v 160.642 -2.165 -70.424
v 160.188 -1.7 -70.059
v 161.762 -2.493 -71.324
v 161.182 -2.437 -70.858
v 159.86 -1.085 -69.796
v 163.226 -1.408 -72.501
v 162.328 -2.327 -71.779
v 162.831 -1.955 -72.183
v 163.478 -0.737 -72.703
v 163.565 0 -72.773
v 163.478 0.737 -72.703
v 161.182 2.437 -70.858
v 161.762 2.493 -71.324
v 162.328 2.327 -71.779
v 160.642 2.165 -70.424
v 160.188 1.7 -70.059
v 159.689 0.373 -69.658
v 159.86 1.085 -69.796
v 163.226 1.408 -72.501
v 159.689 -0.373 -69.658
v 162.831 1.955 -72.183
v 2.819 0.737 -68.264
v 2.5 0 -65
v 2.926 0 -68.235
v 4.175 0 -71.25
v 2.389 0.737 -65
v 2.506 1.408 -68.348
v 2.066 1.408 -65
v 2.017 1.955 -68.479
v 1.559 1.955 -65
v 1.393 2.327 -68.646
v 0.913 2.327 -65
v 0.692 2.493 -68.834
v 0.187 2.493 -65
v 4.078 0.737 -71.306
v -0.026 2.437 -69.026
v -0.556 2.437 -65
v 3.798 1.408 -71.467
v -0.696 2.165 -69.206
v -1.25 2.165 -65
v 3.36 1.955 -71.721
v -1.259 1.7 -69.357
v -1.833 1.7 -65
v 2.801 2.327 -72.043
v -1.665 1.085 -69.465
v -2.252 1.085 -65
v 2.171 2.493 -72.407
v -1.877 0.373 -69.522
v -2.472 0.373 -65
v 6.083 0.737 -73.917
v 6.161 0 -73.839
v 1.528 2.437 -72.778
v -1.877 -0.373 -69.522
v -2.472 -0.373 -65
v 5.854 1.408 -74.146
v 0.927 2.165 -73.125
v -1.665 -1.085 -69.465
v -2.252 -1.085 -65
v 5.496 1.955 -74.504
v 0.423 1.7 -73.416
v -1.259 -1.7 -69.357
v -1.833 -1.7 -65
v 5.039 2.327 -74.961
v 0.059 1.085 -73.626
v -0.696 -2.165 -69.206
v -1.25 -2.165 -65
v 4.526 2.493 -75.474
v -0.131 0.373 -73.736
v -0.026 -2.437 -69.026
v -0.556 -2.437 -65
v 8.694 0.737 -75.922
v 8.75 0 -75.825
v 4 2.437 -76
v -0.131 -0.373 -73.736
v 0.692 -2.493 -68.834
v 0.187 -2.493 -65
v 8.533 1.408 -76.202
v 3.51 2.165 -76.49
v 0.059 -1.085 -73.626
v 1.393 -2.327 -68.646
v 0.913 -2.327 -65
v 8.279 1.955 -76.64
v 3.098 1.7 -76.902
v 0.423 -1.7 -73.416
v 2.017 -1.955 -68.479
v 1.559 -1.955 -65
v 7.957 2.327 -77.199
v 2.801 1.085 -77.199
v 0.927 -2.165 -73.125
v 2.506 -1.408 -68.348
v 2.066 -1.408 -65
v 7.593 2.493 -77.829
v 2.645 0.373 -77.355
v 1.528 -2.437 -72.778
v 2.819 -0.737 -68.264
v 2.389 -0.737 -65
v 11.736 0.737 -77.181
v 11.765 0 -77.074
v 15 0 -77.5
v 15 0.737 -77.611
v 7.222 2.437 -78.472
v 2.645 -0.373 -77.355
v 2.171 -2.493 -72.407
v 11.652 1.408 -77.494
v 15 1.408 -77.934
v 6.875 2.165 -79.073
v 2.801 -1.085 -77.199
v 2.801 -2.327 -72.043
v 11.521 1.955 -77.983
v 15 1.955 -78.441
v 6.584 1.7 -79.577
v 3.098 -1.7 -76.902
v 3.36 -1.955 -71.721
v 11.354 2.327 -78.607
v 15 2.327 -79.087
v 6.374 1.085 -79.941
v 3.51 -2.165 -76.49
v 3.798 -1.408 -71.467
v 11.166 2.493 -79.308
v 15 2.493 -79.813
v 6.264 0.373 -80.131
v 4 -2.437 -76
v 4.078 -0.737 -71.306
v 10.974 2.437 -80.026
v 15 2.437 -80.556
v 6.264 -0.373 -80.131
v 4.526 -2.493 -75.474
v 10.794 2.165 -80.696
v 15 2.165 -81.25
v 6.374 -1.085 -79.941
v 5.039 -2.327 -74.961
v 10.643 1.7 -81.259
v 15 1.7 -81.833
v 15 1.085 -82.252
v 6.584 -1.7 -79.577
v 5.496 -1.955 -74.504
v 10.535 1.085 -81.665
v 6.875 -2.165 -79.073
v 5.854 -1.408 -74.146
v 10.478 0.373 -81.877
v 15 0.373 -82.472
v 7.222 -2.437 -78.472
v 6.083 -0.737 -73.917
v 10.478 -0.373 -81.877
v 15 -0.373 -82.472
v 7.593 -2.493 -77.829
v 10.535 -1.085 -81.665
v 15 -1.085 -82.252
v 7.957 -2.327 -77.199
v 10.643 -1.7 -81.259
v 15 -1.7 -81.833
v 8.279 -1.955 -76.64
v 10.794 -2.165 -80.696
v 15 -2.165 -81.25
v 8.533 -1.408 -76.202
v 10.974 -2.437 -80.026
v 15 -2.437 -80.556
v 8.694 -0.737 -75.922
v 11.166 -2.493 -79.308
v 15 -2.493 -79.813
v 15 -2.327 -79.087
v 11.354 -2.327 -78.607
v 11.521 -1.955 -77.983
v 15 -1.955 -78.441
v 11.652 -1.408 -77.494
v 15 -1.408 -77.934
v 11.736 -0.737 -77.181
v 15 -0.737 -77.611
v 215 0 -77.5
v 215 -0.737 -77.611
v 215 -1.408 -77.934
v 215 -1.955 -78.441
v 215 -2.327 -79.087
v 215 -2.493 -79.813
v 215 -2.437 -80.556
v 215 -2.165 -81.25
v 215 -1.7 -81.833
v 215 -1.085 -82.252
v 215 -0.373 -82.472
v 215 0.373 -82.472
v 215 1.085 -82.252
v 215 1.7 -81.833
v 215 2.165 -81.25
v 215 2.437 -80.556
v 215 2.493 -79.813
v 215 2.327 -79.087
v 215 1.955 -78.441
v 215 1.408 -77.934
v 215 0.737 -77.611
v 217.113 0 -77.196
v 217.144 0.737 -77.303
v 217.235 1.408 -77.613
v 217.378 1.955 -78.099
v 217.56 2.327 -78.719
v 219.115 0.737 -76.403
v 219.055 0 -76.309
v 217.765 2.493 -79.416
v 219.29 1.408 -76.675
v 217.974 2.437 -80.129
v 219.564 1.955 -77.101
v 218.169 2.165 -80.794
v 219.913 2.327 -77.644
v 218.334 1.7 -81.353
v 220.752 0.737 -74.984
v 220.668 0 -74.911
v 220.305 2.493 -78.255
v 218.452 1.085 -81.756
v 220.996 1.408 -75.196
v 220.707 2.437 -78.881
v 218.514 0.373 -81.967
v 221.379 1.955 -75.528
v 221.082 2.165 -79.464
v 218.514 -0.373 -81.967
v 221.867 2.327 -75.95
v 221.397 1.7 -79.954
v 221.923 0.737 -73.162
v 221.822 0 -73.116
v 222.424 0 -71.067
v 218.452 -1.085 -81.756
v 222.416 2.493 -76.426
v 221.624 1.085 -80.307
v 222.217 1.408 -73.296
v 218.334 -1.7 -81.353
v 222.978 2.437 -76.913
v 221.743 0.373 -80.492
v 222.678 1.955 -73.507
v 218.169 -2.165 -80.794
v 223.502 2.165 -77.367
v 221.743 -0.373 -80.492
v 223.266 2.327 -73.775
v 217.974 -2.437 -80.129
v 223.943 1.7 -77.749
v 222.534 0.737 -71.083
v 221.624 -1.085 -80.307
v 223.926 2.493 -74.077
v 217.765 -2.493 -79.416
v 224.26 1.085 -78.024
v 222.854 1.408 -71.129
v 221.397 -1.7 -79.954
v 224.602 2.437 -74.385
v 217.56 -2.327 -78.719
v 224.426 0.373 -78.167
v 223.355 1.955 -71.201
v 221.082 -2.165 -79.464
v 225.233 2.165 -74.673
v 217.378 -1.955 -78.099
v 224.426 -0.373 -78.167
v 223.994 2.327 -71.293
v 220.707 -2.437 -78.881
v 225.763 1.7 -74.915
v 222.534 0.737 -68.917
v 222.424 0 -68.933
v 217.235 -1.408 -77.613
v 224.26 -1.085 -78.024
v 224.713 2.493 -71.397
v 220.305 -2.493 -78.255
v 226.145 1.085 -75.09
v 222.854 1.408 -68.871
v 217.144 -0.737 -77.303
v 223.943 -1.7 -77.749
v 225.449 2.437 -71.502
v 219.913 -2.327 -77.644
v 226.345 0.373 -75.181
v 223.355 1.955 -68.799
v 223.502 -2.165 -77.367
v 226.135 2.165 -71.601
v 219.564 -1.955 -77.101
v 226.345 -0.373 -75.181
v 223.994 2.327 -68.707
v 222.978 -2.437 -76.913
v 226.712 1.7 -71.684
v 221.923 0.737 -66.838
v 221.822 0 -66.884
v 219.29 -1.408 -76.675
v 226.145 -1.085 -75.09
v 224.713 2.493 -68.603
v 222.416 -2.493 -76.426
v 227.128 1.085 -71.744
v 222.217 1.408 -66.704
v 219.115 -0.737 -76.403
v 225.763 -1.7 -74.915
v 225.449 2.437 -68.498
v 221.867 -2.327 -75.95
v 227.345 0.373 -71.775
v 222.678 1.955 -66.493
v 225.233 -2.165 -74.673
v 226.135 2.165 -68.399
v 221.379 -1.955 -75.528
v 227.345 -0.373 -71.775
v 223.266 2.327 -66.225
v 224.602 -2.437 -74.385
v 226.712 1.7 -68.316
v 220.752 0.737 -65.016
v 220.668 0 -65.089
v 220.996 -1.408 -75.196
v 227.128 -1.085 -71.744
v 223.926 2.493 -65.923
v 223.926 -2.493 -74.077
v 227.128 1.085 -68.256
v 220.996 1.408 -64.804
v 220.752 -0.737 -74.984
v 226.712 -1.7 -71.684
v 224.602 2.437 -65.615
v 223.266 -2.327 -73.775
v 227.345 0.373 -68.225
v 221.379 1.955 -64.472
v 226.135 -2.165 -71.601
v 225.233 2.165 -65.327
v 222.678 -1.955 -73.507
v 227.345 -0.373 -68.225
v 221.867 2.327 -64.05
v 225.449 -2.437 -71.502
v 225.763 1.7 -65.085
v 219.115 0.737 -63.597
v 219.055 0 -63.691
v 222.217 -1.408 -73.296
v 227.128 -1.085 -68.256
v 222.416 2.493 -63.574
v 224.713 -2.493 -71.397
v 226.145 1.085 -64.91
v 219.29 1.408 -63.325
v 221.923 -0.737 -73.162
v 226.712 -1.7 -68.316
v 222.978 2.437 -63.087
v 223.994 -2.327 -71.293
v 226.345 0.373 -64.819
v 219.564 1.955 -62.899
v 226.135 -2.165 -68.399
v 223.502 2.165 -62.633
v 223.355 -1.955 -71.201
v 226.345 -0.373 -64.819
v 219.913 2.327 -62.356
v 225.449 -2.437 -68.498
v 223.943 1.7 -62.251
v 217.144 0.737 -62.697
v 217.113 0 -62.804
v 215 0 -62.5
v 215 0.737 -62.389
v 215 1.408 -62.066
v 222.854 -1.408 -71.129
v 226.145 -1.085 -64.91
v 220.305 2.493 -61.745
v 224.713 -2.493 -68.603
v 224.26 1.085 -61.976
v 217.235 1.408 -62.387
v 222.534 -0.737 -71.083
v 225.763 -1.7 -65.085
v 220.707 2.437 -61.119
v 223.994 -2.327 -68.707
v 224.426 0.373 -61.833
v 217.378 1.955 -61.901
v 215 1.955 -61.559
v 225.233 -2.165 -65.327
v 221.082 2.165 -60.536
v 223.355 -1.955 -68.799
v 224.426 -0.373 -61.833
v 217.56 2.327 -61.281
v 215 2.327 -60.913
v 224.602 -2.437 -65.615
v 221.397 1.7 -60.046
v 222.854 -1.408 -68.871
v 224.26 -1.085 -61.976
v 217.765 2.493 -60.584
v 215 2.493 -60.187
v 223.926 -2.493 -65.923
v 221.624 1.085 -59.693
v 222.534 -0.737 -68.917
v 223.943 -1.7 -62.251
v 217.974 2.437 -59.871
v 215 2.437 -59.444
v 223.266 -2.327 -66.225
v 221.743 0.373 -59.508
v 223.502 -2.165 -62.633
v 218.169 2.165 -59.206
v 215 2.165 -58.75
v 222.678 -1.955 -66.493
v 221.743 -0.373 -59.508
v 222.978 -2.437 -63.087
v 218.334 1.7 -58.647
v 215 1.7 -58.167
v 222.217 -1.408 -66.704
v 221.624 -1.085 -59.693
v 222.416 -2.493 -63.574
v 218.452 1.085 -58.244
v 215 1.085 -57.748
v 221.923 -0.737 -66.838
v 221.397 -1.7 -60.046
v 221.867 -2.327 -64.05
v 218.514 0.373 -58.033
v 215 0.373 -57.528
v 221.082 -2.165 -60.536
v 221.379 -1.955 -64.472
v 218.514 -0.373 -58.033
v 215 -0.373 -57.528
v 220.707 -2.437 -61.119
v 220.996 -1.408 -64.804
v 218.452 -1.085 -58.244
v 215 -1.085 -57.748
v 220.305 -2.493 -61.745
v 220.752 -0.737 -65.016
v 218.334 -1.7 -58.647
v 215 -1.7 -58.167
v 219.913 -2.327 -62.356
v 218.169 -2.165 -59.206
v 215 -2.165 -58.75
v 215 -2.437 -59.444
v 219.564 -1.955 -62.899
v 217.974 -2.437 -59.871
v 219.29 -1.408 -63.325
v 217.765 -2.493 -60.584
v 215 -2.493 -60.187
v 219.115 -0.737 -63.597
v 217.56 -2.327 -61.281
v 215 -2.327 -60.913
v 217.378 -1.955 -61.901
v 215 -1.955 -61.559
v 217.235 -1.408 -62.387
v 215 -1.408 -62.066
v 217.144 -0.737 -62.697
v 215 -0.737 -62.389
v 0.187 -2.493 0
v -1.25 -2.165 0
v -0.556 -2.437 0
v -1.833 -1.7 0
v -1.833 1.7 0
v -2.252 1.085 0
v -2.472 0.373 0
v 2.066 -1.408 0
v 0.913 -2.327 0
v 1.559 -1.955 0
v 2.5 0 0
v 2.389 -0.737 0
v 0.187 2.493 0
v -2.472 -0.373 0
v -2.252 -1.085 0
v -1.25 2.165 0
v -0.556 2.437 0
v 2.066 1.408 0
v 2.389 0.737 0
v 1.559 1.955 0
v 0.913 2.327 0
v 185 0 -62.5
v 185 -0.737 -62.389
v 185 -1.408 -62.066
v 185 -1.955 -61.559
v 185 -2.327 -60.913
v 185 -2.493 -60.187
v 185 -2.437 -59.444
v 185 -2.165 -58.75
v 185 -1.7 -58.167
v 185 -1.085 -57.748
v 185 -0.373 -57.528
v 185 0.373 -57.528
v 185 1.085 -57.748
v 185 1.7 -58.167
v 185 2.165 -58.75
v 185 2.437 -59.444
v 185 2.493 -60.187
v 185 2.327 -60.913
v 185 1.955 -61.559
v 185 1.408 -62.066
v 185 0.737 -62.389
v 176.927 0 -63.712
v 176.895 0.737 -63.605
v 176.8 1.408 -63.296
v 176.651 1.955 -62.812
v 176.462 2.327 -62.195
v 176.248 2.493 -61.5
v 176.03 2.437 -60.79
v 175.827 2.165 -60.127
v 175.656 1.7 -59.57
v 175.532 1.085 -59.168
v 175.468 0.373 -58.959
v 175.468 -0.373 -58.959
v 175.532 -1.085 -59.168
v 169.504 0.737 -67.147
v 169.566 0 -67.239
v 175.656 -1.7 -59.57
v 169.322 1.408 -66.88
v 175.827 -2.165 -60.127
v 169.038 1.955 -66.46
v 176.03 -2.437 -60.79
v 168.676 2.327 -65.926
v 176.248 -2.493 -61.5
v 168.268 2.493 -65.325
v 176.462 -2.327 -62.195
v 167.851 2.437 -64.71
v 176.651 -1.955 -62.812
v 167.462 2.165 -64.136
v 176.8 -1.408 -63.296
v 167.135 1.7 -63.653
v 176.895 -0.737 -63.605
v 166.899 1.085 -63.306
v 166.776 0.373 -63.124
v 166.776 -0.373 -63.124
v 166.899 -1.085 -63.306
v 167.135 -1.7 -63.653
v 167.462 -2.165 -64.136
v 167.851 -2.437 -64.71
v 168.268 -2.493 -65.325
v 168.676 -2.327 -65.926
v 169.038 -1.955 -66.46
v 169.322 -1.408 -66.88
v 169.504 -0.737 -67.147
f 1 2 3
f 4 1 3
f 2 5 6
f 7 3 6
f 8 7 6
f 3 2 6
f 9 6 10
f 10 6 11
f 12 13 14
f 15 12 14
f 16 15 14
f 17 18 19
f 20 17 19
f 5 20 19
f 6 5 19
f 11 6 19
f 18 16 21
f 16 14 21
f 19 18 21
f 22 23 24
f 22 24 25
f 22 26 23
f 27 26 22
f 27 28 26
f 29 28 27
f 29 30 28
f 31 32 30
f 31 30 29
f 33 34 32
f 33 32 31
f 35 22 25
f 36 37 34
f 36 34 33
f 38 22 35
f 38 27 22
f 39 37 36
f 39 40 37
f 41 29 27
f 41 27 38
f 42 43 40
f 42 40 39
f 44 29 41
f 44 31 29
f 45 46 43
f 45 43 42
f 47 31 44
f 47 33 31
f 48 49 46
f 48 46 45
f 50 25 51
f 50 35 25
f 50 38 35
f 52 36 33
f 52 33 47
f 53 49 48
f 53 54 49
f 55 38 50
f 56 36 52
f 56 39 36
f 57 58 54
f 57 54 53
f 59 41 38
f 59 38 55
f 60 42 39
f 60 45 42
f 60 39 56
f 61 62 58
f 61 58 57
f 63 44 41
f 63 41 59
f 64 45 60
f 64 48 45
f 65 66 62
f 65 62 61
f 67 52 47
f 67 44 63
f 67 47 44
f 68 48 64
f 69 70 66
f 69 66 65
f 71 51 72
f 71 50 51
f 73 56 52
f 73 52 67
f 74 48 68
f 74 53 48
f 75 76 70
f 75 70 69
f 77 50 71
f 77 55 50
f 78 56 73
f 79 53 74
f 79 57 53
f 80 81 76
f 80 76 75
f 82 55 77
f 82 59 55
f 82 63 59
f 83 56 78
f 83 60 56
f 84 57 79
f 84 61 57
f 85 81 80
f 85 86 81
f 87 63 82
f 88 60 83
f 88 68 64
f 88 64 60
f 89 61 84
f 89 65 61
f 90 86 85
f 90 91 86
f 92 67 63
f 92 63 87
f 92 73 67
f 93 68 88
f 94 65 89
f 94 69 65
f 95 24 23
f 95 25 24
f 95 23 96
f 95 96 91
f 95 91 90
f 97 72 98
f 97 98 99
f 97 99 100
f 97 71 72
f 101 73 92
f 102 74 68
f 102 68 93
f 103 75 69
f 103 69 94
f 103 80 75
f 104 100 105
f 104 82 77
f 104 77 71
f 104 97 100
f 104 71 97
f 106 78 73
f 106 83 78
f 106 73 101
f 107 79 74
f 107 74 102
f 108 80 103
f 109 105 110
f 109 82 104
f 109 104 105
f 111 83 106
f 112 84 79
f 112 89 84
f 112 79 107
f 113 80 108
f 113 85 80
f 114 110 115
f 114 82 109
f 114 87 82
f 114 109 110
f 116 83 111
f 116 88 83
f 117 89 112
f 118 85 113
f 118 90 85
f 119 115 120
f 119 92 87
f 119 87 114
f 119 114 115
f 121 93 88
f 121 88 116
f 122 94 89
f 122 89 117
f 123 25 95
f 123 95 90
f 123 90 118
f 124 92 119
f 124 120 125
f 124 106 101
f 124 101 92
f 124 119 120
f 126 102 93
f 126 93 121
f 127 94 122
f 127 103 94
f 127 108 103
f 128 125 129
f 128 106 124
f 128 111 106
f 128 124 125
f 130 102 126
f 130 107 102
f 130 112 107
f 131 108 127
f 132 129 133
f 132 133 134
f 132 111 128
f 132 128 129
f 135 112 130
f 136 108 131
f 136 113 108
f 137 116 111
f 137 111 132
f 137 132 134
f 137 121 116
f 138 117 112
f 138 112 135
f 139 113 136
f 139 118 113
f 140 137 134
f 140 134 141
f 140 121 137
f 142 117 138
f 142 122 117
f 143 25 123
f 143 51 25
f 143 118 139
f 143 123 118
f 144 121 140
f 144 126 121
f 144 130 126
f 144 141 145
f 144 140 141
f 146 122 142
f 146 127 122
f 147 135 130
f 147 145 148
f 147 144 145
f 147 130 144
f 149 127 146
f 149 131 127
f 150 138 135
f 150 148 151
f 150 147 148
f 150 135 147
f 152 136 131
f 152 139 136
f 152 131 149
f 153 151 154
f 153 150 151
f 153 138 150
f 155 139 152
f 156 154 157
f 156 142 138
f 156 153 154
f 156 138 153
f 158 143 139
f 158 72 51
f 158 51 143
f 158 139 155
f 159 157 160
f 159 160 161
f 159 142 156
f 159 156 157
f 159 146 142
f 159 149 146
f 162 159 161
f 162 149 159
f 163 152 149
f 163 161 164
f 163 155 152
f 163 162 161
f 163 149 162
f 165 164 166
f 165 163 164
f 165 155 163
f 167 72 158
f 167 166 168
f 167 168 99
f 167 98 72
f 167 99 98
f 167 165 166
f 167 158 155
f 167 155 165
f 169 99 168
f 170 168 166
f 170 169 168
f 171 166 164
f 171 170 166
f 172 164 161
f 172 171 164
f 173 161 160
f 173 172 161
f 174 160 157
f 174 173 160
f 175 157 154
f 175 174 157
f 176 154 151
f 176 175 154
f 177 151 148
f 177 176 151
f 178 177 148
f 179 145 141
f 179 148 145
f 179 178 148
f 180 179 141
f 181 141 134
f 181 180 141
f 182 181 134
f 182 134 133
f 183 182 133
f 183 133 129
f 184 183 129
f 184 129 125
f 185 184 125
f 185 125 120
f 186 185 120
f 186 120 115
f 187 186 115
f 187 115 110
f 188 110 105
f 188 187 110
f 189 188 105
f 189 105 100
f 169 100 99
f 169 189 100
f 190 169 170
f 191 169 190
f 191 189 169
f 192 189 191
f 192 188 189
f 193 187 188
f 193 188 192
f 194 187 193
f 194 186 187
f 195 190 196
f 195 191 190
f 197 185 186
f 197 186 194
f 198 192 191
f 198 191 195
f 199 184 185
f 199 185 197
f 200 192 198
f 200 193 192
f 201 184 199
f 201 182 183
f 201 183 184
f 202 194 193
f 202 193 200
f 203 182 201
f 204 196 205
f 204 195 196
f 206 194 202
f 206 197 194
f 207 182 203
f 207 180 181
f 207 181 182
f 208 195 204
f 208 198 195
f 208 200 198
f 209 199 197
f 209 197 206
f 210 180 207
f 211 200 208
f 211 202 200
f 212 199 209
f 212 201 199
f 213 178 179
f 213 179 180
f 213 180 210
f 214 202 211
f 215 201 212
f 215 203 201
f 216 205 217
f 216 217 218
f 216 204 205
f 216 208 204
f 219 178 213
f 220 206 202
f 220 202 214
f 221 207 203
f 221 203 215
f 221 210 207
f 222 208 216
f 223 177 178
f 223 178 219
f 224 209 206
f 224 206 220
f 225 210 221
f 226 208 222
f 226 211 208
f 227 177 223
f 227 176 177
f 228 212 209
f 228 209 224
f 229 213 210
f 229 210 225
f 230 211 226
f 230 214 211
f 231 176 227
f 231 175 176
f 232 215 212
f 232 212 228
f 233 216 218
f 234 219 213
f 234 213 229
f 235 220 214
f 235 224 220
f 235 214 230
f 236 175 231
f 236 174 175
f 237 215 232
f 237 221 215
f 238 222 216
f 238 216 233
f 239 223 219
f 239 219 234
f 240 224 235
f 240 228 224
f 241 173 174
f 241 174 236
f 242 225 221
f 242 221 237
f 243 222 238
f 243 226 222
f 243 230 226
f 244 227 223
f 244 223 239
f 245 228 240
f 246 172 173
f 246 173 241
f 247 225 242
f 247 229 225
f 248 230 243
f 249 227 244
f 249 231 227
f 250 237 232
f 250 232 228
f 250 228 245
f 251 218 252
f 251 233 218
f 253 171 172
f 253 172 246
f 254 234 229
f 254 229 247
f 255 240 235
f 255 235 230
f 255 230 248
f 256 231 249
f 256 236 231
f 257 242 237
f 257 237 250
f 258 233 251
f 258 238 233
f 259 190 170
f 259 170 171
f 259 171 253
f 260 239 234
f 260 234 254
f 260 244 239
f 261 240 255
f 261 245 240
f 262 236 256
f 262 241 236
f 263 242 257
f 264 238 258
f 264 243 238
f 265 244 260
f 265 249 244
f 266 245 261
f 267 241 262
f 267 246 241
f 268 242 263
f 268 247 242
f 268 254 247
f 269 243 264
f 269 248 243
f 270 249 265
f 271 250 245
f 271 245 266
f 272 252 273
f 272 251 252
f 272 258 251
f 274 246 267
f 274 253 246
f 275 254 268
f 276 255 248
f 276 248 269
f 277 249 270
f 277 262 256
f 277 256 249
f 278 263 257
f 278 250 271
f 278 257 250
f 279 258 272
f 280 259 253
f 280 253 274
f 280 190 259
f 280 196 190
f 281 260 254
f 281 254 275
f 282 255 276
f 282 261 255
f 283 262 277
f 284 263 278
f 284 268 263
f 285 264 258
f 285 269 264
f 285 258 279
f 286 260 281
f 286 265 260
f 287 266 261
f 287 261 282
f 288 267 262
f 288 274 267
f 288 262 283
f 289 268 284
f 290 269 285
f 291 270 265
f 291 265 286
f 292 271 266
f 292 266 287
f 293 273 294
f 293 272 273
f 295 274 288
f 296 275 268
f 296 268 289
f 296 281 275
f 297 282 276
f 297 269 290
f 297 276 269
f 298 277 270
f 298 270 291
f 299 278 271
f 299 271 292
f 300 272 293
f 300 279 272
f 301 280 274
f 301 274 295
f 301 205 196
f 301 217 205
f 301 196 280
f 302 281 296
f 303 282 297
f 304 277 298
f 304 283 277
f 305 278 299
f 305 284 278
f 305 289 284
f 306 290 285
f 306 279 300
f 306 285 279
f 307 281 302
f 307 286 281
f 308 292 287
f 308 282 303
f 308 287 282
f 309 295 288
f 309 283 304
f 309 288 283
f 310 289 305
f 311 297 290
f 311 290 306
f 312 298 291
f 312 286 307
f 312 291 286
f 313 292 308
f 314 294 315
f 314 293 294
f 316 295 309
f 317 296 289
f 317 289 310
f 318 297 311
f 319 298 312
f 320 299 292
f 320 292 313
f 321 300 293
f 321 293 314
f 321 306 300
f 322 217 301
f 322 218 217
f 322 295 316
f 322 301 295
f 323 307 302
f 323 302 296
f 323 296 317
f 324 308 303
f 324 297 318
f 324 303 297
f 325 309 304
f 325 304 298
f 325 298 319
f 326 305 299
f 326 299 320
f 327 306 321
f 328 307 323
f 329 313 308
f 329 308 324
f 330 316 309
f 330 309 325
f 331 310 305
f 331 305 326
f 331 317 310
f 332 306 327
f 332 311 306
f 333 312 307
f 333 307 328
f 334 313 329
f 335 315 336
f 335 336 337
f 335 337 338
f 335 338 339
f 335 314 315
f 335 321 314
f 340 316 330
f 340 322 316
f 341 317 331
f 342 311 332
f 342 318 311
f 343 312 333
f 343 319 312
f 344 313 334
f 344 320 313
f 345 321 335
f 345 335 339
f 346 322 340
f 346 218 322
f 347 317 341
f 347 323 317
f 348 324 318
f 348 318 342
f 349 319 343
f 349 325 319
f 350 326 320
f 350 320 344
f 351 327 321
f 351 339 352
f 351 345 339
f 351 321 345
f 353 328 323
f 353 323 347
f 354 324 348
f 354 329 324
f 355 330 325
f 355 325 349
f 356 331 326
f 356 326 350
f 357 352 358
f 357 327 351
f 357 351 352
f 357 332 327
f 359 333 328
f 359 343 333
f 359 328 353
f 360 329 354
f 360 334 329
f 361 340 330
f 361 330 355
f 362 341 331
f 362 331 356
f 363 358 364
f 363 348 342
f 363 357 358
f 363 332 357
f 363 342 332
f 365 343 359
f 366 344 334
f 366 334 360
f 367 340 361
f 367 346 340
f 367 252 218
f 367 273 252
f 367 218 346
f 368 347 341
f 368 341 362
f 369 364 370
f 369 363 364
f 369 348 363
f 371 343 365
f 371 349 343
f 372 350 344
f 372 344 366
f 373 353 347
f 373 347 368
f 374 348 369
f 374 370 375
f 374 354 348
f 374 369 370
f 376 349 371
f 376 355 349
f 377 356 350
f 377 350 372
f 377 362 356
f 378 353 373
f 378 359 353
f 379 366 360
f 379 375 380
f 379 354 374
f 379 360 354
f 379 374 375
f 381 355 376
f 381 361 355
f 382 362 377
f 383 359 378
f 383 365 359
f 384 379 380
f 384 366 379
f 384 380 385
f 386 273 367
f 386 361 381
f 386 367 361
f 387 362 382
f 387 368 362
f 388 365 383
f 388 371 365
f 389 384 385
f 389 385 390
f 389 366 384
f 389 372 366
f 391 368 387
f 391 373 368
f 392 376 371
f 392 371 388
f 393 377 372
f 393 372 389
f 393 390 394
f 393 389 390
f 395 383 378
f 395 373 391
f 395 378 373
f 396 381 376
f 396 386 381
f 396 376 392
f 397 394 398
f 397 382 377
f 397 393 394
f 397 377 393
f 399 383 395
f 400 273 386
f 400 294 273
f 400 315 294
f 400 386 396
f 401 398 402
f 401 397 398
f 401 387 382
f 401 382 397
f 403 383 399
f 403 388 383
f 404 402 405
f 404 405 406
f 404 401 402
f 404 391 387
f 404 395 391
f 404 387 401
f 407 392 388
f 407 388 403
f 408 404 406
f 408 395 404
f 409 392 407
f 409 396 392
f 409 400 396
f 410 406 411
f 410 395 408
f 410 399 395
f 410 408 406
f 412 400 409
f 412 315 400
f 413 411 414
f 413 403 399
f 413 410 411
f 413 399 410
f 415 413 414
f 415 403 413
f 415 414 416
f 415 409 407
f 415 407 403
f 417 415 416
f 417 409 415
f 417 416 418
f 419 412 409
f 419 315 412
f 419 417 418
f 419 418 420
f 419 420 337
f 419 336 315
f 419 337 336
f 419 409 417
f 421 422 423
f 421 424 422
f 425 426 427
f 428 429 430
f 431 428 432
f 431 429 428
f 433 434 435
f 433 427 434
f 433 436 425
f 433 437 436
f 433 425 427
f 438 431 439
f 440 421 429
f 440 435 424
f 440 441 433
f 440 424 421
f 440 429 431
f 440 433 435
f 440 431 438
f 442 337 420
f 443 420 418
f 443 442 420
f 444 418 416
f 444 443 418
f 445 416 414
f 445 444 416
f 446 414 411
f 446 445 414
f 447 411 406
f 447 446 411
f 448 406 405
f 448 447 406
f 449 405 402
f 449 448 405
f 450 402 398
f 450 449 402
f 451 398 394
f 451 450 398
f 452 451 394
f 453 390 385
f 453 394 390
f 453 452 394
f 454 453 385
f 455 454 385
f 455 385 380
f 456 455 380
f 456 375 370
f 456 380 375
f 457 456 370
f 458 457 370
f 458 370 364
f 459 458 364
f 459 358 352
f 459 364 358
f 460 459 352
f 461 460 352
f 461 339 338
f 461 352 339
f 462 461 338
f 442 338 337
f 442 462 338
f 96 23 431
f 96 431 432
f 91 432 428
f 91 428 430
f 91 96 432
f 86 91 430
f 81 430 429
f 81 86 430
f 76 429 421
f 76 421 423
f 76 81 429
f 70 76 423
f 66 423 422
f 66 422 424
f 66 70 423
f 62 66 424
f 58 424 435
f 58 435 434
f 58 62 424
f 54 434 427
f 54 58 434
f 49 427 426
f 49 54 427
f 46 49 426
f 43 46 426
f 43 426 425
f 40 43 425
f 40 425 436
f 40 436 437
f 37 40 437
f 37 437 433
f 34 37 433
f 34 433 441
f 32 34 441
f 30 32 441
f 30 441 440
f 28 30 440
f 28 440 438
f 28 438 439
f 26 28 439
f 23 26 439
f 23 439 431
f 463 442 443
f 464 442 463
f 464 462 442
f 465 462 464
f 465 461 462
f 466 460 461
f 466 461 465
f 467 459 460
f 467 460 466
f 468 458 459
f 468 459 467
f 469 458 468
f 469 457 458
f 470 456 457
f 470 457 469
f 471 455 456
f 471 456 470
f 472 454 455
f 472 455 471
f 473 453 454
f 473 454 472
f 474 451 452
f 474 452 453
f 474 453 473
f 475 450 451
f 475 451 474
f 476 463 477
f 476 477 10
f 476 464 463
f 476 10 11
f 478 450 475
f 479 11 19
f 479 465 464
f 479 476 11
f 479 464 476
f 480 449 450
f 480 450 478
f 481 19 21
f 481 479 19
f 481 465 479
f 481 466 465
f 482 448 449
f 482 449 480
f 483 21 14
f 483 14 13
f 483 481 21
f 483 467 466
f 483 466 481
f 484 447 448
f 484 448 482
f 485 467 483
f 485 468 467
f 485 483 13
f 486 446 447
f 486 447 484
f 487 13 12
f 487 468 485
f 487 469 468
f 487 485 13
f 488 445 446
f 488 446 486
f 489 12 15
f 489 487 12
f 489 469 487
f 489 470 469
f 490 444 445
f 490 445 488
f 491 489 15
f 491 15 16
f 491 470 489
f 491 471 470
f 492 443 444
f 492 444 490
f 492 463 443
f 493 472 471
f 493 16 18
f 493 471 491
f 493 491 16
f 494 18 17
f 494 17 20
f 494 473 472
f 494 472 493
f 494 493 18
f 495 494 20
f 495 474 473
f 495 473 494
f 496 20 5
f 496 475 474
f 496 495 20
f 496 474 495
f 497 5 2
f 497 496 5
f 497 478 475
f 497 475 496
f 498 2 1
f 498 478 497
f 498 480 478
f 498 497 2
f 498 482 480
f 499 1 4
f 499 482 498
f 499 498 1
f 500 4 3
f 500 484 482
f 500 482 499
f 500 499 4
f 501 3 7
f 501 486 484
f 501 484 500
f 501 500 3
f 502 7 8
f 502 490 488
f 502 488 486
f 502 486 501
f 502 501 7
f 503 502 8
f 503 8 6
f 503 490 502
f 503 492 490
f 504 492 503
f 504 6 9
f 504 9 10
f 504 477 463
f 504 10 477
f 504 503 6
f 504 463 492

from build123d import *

# Parameters (mm, degrees)
SKETCH2_R = 2.5


with BuildPart() as part:
    # Sweep1: sweep along a path in Sketch1
    with BuildLine(Plane(origin=(0, 0, 0), x_dir=(1, 0, 0), z_dir=(0, 1, 0))) as sweep1_path:
        Line((0, 0), (0, 65))
        ThreePointArc((0, 65), (4.393398282, 75.606601718), (15, 80))
        Line((15, 80), (215, 80))
        ThreePointArc((215, 80), (225, 70), (215, 60))
        Line((215, 60), (185, 60))
        ThreePointArc((185, 60), (172.034701688, 62.946330384), (161.616073533, 71.206597355))
    # Sketch2 → Sweep1 (sweep)
    with BuildSketch(Plane.XY):
        Circle(SKETCH2_R)
    sweep(path=sweep1_path.line)


solid = part.part
